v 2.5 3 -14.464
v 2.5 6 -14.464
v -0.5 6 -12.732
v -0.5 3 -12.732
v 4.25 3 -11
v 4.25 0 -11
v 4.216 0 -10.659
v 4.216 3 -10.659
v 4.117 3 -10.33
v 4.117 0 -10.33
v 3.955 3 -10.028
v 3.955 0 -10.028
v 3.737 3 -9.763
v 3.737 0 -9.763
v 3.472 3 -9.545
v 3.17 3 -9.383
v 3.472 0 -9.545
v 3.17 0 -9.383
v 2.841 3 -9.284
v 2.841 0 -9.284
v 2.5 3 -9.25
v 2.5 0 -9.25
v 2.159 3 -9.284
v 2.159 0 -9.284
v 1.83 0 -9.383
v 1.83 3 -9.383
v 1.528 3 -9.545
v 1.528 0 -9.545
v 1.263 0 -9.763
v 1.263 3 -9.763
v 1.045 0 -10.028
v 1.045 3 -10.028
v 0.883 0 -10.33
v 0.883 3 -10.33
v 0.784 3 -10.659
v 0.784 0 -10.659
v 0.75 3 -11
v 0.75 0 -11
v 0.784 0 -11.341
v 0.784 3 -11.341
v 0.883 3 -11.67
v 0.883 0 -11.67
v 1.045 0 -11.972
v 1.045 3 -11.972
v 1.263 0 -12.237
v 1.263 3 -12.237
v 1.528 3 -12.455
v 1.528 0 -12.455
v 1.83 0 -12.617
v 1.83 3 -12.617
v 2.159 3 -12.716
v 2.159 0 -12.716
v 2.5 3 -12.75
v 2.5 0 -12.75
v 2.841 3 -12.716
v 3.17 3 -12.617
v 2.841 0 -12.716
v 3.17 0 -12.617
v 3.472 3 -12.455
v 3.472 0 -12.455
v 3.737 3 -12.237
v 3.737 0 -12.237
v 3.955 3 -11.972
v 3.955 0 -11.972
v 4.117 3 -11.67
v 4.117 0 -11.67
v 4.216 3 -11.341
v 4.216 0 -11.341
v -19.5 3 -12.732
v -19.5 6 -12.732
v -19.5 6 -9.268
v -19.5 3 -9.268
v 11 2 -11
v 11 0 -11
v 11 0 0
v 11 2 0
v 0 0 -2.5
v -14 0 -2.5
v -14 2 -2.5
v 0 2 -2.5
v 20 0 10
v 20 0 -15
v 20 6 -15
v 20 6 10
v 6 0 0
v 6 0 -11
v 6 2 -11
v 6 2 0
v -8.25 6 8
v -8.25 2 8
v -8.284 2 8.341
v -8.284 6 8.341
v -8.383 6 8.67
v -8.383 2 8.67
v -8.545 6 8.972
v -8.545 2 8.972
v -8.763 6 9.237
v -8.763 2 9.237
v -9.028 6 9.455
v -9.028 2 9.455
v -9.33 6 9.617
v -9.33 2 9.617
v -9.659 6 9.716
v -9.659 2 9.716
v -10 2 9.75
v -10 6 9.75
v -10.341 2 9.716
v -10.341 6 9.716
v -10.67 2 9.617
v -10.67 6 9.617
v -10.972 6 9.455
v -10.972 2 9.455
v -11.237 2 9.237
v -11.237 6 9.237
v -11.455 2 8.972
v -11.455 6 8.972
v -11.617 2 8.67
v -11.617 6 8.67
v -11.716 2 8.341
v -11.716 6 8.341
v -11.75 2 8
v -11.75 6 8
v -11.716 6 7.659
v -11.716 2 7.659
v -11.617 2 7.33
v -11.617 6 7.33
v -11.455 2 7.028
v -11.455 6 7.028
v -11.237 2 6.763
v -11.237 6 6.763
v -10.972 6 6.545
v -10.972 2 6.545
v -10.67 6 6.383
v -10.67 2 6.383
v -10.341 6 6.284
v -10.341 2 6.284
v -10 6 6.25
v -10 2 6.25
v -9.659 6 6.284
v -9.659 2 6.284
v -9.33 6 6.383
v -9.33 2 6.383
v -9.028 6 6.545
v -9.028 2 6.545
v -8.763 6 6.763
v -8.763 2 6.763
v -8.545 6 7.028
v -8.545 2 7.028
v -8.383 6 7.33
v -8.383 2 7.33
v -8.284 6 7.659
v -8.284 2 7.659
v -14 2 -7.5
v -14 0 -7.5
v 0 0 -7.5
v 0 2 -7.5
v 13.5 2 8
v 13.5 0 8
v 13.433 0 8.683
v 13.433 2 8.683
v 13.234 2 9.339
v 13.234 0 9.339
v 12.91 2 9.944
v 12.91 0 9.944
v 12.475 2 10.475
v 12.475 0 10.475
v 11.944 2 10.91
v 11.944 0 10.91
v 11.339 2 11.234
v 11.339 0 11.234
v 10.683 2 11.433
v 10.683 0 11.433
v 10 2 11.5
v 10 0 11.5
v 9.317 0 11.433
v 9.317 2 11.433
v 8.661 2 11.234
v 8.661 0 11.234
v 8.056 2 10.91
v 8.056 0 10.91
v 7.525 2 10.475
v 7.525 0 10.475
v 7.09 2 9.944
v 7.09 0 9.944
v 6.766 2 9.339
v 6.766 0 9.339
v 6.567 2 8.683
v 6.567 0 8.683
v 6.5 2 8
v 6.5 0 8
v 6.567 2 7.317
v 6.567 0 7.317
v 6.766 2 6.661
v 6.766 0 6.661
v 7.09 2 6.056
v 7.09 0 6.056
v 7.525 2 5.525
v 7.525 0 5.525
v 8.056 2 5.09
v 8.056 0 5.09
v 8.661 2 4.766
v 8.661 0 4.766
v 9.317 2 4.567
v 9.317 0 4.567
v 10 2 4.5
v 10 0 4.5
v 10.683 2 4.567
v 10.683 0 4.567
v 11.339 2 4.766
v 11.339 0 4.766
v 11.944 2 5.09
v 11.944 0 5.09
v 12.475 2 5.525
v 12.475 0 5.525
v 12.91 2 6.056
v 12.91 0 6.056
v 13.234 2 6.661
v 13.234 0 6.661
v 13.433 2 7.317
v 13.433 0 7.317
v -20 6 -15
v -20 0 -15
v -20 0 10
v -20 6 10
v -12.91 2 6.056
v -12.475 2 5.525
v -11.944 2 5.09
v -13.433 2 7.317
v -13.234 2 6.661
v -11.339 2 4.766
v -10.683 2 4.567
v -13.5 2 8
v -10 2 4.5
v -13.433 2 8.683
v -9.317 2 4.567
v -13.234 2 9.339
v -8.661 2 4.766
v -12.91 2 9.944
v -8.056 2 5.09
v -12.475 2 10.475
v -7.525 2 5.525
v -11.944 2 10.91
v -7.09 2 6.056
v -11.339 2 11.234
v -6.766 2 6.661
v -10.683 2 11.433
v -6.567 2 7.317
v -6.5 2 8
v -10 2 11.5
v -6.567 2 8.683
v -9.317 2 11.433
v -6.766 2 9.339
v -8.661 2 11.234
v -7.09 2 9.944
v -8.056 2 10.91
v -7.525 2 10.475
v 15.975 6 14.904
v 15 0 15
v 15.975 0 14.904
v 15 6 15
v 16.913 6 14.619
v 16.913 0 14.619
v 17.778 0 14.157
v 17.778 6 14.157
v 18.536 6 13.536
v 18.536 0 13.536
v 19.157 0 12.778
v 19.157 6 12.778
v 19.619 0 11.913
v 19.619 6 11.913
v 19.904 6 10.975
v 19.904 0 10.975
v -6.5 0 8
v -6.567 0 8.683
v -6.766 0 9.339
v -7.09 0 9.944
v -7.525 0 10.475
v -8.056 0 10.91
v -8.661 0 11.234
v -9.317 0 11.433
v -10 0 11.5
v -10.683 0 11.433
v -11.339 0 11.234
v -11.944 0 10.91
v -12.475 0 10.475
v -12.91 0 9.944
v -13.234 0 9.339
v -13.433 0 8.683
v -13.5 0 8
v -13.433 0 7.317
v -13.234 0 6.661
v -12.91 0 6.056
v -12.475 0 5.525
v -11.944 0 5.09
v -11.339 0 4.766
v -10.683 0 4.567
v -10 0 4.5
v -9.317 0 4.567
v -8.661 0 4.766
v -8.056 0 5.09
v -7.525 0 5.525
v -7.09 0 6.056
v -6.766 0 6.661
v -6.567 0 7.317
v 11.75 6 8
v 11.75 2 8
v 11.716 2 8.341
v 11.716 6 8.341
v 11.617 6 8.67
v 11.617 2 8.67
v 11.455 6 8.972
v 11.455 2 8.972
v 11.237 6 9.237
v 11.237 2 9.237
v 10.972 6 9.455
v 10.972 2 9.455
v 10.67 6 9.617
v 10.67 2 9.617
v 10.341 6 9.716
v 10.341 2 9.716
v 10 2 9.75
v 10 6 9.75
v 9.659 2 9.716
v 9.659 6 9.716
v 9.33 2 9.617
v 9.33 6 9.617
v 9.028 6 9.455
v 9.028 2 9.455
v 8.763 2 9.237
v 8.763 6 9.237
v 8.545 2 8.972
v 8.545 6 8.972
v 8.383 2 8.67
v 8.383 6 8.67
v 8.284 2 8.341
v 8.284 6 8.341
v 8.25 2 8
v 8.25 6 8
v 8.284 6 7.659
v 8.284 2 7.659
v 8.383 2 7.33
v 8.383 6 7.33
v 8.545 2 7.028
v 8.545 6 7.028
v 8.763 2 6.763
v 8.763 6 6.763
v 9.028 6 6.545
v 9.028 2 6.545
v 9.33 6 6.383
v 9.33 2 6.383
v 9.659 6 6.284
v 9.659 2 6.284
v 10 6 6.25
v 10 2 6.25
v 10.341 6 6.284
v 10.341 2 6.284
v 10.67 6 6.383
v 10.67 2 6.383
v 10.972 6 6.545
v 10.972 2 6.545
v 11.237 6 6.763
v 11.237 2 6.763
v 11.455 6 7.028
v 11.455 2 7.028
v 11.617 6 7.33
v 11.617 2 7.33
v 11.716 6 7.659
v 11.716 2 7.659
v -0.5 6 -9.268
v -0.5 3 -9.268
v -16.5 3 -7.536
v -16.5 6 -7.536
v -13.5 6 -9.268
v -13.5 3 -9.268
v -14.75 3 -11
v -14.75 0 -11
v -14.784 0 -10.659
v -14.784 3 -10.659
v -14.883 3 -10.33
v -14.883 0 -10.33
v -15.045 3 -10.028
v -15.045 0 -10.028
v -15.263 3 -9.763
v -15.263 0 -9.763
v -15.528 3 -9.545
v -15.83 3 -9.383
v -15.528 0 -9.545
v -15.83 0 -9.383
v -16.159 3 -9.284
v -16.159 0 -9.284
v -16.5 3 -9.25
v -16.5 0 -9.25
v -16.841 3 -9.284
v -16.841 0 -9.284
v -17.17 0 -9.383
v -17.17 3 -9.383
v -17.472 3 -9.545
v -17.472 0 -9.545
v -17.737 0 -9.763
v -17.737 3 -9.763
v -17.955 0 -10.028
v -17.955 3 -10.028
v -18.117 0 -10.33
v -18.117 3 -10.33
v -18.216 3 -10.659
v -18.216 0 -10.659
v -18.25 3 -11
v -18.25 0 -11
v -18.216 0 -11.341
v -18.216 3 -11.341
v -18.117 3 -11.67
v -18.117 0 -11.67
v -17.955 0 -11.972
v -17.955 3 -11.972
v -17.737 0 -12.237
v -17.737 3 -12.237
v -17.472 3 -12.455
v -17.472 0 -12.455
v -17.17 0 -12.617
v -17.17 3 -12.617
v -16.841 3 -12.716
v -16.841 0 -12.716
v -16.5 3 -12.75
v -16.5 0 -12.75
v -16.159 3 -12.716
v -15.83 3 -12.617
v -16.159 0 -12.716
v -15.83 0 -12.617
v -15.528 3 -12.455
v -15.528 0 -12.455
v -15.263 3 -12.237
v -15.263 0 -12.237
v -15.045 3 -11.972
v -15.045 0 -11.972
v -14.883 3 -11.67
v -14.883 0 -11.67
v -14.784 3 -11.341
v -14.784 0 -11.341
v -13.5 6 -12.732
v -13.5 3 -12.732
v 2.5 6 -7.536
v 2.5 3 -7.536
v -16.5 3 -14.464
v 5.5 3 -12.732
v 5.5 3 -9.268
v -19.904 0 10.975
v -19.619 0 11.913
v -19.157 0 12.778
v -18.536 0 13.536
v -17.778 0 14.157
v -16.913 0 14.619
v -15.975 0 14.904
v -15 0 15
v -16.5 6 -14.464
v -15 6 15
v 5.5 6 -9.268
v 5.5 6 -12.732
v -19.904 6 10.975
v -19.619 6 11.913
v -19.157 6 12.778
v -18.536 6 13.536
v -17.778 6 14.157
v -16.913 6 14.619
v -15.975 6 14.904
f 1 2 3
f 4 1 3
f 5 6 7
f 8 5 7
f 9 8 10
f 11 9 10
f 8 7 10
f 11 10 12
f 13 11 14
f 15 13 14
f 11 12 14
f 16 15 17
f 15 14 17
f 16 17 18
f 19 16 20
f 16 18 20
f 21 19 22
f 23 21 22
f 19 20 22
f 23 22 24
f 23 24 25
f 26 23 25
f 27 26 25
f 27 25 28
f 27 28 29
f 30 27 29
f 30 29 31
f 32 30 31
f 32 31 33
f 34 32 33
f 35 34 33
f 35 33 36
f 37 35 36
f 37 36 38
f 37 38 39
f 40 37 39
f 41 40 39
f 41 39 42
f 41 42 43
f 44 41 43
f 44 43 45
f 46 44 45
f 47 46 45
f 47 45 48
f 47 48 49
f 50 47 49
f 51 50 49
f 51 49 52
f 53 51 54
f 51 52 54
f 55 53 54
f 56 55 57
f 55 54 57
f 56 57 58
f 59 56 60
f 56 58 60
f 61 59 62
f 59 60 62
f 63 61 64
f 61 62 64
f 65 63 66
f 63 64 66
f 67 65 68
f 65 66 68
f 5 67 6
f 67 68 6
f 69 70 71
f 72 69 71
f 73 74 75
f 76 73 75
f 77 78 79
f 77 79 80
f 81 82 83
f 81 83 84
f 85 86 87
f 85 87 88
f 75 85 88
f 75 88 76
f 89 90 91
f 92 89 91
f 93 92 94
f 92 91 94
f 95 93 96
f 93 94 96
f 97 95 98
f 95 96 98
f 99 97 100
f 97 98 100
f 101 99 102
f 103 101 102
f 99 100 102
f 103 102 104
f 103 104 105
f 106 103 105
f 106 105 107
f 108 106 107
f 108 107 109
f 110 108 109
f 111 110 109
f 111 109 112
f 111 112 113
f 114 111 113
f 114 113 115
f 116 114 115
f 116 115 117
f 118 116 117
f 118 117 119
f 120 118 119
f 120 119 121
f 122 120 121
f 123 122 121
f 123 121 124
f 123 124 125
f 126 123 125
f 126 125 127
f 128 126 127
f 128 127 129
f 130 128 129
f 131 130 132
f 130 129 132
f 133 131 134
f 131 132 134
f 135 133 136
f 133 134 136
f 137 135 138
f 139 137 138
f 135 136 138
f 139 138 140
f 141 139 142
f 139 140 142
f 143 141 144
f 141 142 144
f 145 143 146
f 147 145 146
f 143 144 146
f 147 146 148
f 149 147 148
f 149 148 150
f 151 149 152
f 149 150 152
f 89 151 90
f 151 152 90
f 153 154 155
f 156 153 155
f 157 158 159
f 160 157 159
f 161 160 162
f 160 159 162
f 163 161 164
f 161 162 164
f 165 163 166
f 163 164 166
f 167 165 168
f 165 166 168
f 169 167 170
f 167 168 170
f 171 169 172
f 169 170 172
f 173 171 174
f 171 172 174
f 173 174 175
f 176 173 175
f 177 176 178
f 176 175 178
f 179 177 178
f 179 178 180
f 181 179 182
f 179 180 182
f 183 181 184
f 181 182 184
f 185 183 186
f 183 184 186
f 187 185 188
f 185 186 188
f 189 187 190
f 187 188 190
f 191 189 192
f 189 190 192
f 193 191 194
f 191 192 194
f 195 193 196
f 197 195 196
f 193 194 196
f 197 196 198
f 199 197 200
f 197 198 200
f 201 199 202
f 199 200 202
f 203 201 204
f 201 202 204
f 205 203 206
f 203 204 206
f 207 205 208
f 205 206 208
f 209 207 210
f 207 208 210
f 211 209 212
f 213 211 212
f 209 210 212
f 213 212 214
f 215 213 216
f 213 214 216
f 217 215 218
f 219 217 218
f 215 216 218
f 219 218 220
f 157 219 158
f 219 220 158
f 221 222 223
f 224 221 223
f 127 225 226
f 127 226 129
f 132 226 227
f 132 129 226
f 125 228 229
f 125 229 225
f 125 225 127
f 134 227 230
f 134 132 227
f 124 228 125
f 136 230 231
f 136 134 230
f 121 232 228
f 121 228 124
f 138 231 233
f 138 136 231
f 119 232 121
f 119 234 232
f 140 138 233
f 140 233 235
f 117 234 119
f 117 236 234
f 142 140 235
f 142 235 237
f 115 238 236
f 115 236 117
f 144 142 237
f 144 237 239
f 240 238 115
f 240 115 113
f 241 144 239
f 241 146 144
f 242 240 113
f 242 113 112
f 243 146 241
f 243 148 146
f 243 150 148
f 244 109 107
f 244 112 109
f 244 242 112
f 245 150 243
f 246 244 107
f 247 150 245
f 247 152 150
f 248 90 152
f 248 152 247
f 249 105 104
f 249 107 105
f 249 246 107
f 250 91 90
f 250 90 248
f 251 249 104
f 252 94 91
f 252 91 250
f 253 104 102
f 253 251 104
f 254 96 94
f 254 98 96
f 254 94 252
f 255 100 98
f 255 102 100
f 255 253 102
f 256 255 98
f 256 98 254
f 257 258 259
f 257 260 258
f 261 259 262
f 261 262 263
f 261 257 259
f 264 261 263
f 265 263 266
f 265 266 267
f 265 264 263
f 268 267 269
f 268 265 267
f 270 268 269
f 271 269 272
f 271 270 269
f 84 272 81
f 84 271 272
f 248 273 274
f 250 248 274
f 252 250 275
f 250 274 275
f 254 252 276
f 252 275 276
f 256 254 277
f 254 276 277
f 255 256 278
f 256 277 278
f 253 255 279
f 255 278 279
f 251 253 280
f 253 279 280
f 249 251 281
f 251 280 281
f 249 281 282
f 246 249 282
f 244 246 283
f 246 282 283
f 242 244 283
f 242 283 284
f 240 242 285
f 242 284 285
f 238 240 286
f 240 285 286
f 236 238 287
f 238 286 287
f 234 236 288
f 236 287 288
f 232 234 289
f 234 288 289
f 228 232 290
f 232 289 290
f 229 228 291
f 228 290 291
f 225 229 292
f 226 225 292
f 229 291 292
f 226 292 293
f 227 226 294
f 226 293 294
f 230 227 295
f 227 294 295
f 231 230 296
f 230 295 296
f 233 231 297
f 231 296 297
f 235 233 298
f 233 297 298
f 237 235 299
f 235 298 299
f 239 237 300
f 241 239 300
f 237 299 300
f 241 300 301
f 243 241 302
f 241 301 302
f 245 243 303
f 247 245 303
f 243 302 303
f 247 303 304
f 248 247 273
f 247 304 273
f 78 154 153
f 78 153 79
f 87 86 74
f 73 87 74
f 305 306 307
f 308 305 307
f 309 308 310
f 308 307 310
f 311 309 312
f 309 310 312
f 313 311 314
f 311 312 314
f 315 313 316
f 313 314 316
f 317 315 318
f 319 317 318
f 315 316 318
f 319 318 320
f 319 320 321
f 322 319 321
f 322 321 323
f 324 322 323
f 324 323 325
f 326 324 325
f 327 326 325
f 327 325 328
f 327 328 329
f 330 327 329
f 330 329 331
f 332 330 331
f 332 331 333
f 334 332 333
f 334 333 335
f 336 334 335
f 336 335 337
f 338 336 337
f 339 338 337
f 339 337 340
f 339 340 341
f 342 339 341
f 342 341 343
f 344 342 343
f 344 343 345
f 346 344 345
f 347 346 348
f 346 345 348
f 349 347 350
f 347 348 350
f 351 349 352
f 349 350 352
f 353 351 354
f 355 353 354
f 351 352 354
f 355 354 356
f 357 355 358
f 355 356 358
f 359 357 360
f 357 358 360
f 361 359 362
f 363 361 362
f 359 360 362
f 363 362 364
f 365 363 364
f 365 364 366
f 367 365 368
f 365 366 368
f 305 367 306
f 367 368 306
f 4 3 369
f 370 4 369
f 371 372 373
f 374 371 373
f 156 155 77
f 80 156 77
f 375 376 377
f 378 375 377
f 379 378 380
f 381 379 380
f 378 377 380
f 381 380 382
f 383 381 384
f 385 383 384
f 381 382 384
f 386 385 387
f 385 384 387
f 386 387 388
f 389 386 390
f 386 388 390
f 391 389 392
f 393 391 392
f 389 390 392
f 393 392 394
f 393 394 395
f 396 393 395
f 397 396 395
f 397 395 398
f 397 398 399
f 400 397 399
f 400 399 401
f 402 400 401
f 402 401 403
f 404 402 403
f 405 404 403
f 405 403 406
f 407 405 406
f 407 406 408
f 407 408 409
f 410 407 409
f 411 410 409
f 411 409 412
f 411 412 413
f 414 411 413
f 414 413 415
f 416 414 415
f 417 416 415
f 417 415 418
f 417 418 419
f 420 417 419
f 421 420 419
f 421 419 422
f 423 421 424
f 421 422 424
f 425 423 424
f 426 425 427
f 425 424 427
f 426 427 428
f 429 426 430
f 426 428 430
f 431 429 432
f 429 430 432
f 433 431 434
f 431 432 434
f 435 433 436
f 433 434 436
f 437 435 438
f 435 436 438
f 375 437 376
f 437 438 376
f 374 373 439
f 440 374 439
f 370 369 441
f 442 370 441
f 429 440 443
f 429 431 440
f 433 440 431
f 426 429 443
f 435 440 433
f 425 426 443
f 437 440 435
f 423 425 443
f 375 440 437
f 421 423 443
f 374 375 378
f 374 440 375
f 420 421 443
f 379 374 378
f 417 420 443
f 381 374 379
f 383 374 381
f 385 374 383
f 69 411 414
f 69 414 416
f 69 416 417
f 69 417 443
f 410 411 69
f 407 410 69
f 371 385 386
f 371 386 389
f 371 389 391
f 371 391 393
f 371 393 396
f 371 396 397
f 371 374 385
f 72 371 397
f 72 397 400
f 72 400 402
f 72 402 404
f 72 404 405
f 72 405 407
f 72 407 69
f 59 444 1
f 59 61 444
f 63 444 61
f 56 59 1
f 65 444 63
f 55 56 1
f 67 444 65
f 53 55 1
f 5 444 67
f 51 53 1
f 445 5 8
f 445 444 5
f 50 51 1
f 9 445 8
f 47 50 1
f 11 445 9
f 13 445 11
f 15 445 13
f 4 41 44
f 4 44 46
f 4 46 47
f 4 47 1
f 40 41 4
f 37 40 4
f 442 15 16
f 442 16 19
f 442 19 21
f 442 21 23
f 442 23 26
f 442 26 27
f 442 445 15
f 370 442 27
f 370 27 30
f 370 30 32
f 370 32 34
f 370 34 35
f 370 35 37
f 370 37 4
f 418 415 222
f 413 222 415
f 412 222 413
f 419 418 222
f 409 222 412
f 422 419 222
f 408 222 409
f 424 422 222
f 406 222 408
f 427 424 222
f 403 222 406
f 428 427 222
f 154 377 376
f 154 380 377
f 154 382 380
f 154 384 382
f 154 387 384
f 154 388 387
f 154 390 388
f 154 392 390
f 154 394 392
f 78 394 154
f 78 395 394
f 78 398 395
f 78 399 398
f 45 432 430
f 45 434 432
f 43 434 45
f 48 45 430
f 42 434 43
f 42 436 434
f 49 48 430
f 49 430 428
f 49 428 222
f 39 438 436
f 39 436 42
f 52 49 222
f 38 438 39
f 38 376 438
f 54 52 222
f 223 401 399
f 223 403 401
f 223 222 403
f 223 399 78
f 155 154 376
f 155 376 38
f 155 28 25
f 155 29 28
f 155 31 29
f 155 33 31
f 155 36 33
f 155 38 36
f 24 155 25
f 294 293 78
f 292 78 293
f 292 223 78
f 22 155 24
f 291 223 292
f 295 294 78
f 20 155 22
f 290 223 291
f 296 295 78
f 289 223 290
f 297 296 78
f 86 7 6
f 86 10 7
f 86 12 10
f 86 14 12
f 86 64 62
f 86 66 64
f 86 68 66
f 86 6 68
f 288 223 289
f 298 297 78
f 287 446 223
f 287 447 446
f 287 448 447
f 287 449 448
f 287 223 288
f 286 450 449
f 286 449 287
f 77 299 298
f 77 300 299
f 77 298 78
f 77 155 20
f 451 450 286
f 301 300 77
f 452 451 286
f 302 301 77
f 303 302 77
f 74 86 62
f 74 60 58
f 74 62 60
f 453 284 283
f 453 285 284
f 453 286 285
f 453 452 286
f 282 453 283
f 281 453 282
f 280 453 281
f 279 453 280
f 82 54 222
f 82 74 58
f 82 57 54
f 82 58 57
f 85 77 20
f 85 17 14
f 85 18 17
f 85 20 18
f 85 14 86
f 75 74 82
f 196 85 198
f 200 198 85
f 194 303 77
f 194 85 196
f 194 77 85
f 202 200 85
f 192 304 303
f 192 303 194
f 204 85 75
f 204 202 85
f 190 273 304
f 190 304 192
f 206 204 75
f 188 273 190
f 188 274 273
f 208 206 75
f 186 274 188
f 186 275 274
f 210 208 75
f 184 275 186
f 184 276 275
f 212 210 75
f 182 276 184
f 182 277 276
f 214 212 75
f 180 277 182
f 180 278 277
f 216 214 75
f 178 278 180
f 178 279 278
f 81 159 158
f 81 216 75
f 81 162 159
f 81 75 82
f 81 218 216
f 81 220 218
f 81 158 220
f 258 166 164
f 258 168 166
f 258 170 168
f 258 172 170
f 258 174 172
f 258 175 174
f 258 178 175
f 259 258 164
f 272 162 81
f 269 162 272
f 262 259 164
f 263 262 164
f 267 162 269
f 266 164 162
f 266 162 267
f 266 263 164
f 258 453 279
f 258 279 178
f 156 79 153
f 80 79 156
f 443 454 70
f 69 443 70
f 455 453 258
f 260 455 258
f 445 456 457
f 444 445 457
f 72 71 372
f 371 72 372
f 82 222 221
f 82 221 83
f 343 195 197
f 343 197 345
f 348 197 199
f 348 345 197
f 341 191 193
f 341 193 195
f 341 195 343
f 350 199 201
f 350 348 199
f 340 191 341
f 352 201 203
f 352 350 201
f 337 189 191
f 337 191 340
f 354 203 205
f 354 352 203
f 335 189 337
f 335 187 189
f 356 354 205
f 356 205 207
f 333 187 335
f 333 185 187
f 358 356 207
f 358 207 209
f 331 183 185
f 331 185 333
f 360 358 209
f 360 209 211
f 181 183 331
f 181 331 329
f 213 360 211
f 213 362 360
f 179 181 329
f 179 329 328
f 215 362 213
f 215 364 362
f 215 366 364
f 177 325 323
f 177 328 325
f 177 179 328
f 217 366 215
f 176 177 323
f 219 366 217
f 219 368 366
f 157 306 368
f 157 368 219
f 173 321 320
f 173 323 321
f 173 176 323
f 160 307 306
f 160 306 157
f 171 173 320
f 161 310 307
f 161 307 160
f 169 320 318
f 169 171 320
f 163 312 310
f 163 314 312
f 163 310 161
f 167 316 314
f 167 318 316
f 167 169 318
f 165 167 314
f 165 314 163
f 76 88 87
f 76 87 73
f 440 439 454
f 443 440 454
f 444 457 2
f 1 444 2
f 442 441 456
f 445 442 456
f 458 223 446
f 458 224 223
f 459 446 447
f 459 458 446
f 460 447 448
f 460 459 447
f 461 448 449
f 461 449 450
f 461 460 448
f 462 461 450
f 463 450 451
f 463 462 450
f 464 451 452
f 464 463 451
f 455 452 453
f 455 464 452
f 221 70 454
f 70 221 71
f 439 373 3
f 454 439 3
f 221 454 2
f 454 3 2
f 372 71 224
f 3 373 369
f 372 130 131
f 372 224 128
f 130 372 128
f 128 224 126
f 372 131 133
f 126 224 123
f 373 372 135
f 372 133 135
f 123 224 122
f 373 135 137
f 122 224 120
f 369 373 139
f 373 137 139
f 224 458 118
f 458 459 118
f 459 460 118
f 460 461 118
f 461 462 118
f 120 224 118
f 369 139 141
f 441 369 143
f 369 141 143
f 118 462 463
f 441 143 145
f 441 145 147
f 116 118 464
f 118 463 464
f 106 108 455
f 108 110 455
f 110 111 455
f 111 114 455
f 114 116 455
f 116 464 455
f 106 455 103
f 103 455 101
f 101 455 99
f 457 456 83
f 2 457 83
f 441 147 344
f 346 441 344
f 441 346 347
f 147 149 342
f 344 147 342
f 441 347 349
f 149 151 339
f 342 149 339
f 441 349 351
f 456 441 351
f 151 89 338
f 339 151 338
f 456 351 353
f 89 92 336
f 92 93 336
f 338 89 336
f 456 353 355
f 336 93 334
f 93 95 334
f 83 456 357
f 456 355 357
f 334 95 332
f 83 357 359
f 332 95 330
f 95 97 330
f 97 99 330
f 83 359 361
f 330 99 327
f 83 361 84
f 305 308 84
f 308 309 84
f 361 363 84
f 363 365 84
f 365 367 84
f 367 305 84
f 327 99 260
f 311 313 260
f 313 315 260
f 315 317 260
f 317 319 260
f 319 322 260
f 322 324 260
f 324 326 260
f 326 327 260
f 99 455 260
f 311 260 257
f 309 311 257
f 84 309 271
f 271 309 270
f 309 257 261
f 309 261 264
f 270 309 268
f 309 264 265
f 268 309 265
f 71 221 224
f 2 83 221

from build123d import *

# Parameters (mm, degrees)
F0_W     = 40
F0_H     = 30
F0_R     = 1.75
F0_W_2   = 14
F0_H_2   = 5
F0_W_3   = 5
F0_H_3   = 11
F0_R_2   = 3.5
F1_DEPTH = 6
F2_DEPTH = 2
F4_DEPTH = 3
F5_R     = 5


with BuildPart() as f1:
    # F0 (on Front) → F1 (new body)
    with BuildSketch(Plane.XZ):
        Rectangle(F0_W, F0_H)
        with Locations((-16.5, -11)):
            Circle(F0_R, mode=Mode.SUBTRACT)
        with Locations((-7, -5)):
            Rectangle(F0_W_2, F0_H_2, mode=Mode.SUBTRACT)
        with Locations((2.5, -11)):
            Circle(F0_R, mode=Mode.SUBTRACT)
        with Locations((8.5, -5.5)):
            Rectangle(F0_W_3, F0_H_3, mode=Mode.SUBTRACT)
        with Locations((-10, 8)):
            Circle(F0_R_2, mode=Mode.SUBTRACT)
        with Locations((10, 8)):
            Circle(F0_R_2, mode=Mode.SUBTRACT)
        with Locations((-7, -5)):
            Rectangle(F0_W_2, F0_H_2)
        with Locations((8.5, -5.5)):
            Rectangle(F0_W_3, F0_H_3)
        with Locations((10, 8)):
            Circle(F0_R_2)
        with Locations((10, 8)):
            Circle(F0_R, mode=Mode.SUBTRACT)
        with Locations((-10, 8)):
            Circle(F0_R_2)
        with Locations((-10, 8)):
            Circle(F0_R, mode=Mode.SUBTRACT)
    extrude(amount=-F1_DEPTH)

    # F0 (on Front) → F2 (cut)
    with BuildSketch(Plane.XZ):
        with Locations((8.5, -5.5)):
            Rectangle(F0_W_3, F0_H_3)
        with Locations((-7, -5)):
            Rectangle(F0_W_2, F0_H_2)
        with Locations((-10, 8)):
            Circle(F0_R_2)
        with Locations((-10, 8)):
            Circle(F0_R, mode=Mode.SUBTRACT)
        with Locations((10, 8)):
            Circle(F0_R_2)
        with Locations((10, 8)):
            Circle(F0_R, mode=Mode.SUBTRACT)
    extrude(amount=-F2_DEPTH, mode=Mode.SUBTRACT)

    # F3 (on face) → F4 (cut)
    with BuildSketch(Plane(origin=(0, 6, 0), x_dir=(-1, 0, 0), z_dir=(0, 1, 0))):
        Polygon((-2.5, -7.535898), (-5.5, -9.267949), (-5.5, -12.732051), (-2.5, -14.464102), (0.5, -12.732051), (0.5, -9.267949), align=None)
        Polygon((13.5, -9.267949), (13.5, -12.732051), (16.5, -14.464102), (19.5, -12.732051), (19.5, -9.267949), (16.5, -7.535898), align=None)
    extrude(amount=-F4_DEPTH, mode=Mode.SUBTRACT)

    # F5
    f5_edges = [f1.edges().sort_by_distance(p)[0] for p in [
        (20, 3, 15),
        (-20, 3, 15),
    ]]
    fillet(f5_edges, radius=F5_R)


solid = f1.part
